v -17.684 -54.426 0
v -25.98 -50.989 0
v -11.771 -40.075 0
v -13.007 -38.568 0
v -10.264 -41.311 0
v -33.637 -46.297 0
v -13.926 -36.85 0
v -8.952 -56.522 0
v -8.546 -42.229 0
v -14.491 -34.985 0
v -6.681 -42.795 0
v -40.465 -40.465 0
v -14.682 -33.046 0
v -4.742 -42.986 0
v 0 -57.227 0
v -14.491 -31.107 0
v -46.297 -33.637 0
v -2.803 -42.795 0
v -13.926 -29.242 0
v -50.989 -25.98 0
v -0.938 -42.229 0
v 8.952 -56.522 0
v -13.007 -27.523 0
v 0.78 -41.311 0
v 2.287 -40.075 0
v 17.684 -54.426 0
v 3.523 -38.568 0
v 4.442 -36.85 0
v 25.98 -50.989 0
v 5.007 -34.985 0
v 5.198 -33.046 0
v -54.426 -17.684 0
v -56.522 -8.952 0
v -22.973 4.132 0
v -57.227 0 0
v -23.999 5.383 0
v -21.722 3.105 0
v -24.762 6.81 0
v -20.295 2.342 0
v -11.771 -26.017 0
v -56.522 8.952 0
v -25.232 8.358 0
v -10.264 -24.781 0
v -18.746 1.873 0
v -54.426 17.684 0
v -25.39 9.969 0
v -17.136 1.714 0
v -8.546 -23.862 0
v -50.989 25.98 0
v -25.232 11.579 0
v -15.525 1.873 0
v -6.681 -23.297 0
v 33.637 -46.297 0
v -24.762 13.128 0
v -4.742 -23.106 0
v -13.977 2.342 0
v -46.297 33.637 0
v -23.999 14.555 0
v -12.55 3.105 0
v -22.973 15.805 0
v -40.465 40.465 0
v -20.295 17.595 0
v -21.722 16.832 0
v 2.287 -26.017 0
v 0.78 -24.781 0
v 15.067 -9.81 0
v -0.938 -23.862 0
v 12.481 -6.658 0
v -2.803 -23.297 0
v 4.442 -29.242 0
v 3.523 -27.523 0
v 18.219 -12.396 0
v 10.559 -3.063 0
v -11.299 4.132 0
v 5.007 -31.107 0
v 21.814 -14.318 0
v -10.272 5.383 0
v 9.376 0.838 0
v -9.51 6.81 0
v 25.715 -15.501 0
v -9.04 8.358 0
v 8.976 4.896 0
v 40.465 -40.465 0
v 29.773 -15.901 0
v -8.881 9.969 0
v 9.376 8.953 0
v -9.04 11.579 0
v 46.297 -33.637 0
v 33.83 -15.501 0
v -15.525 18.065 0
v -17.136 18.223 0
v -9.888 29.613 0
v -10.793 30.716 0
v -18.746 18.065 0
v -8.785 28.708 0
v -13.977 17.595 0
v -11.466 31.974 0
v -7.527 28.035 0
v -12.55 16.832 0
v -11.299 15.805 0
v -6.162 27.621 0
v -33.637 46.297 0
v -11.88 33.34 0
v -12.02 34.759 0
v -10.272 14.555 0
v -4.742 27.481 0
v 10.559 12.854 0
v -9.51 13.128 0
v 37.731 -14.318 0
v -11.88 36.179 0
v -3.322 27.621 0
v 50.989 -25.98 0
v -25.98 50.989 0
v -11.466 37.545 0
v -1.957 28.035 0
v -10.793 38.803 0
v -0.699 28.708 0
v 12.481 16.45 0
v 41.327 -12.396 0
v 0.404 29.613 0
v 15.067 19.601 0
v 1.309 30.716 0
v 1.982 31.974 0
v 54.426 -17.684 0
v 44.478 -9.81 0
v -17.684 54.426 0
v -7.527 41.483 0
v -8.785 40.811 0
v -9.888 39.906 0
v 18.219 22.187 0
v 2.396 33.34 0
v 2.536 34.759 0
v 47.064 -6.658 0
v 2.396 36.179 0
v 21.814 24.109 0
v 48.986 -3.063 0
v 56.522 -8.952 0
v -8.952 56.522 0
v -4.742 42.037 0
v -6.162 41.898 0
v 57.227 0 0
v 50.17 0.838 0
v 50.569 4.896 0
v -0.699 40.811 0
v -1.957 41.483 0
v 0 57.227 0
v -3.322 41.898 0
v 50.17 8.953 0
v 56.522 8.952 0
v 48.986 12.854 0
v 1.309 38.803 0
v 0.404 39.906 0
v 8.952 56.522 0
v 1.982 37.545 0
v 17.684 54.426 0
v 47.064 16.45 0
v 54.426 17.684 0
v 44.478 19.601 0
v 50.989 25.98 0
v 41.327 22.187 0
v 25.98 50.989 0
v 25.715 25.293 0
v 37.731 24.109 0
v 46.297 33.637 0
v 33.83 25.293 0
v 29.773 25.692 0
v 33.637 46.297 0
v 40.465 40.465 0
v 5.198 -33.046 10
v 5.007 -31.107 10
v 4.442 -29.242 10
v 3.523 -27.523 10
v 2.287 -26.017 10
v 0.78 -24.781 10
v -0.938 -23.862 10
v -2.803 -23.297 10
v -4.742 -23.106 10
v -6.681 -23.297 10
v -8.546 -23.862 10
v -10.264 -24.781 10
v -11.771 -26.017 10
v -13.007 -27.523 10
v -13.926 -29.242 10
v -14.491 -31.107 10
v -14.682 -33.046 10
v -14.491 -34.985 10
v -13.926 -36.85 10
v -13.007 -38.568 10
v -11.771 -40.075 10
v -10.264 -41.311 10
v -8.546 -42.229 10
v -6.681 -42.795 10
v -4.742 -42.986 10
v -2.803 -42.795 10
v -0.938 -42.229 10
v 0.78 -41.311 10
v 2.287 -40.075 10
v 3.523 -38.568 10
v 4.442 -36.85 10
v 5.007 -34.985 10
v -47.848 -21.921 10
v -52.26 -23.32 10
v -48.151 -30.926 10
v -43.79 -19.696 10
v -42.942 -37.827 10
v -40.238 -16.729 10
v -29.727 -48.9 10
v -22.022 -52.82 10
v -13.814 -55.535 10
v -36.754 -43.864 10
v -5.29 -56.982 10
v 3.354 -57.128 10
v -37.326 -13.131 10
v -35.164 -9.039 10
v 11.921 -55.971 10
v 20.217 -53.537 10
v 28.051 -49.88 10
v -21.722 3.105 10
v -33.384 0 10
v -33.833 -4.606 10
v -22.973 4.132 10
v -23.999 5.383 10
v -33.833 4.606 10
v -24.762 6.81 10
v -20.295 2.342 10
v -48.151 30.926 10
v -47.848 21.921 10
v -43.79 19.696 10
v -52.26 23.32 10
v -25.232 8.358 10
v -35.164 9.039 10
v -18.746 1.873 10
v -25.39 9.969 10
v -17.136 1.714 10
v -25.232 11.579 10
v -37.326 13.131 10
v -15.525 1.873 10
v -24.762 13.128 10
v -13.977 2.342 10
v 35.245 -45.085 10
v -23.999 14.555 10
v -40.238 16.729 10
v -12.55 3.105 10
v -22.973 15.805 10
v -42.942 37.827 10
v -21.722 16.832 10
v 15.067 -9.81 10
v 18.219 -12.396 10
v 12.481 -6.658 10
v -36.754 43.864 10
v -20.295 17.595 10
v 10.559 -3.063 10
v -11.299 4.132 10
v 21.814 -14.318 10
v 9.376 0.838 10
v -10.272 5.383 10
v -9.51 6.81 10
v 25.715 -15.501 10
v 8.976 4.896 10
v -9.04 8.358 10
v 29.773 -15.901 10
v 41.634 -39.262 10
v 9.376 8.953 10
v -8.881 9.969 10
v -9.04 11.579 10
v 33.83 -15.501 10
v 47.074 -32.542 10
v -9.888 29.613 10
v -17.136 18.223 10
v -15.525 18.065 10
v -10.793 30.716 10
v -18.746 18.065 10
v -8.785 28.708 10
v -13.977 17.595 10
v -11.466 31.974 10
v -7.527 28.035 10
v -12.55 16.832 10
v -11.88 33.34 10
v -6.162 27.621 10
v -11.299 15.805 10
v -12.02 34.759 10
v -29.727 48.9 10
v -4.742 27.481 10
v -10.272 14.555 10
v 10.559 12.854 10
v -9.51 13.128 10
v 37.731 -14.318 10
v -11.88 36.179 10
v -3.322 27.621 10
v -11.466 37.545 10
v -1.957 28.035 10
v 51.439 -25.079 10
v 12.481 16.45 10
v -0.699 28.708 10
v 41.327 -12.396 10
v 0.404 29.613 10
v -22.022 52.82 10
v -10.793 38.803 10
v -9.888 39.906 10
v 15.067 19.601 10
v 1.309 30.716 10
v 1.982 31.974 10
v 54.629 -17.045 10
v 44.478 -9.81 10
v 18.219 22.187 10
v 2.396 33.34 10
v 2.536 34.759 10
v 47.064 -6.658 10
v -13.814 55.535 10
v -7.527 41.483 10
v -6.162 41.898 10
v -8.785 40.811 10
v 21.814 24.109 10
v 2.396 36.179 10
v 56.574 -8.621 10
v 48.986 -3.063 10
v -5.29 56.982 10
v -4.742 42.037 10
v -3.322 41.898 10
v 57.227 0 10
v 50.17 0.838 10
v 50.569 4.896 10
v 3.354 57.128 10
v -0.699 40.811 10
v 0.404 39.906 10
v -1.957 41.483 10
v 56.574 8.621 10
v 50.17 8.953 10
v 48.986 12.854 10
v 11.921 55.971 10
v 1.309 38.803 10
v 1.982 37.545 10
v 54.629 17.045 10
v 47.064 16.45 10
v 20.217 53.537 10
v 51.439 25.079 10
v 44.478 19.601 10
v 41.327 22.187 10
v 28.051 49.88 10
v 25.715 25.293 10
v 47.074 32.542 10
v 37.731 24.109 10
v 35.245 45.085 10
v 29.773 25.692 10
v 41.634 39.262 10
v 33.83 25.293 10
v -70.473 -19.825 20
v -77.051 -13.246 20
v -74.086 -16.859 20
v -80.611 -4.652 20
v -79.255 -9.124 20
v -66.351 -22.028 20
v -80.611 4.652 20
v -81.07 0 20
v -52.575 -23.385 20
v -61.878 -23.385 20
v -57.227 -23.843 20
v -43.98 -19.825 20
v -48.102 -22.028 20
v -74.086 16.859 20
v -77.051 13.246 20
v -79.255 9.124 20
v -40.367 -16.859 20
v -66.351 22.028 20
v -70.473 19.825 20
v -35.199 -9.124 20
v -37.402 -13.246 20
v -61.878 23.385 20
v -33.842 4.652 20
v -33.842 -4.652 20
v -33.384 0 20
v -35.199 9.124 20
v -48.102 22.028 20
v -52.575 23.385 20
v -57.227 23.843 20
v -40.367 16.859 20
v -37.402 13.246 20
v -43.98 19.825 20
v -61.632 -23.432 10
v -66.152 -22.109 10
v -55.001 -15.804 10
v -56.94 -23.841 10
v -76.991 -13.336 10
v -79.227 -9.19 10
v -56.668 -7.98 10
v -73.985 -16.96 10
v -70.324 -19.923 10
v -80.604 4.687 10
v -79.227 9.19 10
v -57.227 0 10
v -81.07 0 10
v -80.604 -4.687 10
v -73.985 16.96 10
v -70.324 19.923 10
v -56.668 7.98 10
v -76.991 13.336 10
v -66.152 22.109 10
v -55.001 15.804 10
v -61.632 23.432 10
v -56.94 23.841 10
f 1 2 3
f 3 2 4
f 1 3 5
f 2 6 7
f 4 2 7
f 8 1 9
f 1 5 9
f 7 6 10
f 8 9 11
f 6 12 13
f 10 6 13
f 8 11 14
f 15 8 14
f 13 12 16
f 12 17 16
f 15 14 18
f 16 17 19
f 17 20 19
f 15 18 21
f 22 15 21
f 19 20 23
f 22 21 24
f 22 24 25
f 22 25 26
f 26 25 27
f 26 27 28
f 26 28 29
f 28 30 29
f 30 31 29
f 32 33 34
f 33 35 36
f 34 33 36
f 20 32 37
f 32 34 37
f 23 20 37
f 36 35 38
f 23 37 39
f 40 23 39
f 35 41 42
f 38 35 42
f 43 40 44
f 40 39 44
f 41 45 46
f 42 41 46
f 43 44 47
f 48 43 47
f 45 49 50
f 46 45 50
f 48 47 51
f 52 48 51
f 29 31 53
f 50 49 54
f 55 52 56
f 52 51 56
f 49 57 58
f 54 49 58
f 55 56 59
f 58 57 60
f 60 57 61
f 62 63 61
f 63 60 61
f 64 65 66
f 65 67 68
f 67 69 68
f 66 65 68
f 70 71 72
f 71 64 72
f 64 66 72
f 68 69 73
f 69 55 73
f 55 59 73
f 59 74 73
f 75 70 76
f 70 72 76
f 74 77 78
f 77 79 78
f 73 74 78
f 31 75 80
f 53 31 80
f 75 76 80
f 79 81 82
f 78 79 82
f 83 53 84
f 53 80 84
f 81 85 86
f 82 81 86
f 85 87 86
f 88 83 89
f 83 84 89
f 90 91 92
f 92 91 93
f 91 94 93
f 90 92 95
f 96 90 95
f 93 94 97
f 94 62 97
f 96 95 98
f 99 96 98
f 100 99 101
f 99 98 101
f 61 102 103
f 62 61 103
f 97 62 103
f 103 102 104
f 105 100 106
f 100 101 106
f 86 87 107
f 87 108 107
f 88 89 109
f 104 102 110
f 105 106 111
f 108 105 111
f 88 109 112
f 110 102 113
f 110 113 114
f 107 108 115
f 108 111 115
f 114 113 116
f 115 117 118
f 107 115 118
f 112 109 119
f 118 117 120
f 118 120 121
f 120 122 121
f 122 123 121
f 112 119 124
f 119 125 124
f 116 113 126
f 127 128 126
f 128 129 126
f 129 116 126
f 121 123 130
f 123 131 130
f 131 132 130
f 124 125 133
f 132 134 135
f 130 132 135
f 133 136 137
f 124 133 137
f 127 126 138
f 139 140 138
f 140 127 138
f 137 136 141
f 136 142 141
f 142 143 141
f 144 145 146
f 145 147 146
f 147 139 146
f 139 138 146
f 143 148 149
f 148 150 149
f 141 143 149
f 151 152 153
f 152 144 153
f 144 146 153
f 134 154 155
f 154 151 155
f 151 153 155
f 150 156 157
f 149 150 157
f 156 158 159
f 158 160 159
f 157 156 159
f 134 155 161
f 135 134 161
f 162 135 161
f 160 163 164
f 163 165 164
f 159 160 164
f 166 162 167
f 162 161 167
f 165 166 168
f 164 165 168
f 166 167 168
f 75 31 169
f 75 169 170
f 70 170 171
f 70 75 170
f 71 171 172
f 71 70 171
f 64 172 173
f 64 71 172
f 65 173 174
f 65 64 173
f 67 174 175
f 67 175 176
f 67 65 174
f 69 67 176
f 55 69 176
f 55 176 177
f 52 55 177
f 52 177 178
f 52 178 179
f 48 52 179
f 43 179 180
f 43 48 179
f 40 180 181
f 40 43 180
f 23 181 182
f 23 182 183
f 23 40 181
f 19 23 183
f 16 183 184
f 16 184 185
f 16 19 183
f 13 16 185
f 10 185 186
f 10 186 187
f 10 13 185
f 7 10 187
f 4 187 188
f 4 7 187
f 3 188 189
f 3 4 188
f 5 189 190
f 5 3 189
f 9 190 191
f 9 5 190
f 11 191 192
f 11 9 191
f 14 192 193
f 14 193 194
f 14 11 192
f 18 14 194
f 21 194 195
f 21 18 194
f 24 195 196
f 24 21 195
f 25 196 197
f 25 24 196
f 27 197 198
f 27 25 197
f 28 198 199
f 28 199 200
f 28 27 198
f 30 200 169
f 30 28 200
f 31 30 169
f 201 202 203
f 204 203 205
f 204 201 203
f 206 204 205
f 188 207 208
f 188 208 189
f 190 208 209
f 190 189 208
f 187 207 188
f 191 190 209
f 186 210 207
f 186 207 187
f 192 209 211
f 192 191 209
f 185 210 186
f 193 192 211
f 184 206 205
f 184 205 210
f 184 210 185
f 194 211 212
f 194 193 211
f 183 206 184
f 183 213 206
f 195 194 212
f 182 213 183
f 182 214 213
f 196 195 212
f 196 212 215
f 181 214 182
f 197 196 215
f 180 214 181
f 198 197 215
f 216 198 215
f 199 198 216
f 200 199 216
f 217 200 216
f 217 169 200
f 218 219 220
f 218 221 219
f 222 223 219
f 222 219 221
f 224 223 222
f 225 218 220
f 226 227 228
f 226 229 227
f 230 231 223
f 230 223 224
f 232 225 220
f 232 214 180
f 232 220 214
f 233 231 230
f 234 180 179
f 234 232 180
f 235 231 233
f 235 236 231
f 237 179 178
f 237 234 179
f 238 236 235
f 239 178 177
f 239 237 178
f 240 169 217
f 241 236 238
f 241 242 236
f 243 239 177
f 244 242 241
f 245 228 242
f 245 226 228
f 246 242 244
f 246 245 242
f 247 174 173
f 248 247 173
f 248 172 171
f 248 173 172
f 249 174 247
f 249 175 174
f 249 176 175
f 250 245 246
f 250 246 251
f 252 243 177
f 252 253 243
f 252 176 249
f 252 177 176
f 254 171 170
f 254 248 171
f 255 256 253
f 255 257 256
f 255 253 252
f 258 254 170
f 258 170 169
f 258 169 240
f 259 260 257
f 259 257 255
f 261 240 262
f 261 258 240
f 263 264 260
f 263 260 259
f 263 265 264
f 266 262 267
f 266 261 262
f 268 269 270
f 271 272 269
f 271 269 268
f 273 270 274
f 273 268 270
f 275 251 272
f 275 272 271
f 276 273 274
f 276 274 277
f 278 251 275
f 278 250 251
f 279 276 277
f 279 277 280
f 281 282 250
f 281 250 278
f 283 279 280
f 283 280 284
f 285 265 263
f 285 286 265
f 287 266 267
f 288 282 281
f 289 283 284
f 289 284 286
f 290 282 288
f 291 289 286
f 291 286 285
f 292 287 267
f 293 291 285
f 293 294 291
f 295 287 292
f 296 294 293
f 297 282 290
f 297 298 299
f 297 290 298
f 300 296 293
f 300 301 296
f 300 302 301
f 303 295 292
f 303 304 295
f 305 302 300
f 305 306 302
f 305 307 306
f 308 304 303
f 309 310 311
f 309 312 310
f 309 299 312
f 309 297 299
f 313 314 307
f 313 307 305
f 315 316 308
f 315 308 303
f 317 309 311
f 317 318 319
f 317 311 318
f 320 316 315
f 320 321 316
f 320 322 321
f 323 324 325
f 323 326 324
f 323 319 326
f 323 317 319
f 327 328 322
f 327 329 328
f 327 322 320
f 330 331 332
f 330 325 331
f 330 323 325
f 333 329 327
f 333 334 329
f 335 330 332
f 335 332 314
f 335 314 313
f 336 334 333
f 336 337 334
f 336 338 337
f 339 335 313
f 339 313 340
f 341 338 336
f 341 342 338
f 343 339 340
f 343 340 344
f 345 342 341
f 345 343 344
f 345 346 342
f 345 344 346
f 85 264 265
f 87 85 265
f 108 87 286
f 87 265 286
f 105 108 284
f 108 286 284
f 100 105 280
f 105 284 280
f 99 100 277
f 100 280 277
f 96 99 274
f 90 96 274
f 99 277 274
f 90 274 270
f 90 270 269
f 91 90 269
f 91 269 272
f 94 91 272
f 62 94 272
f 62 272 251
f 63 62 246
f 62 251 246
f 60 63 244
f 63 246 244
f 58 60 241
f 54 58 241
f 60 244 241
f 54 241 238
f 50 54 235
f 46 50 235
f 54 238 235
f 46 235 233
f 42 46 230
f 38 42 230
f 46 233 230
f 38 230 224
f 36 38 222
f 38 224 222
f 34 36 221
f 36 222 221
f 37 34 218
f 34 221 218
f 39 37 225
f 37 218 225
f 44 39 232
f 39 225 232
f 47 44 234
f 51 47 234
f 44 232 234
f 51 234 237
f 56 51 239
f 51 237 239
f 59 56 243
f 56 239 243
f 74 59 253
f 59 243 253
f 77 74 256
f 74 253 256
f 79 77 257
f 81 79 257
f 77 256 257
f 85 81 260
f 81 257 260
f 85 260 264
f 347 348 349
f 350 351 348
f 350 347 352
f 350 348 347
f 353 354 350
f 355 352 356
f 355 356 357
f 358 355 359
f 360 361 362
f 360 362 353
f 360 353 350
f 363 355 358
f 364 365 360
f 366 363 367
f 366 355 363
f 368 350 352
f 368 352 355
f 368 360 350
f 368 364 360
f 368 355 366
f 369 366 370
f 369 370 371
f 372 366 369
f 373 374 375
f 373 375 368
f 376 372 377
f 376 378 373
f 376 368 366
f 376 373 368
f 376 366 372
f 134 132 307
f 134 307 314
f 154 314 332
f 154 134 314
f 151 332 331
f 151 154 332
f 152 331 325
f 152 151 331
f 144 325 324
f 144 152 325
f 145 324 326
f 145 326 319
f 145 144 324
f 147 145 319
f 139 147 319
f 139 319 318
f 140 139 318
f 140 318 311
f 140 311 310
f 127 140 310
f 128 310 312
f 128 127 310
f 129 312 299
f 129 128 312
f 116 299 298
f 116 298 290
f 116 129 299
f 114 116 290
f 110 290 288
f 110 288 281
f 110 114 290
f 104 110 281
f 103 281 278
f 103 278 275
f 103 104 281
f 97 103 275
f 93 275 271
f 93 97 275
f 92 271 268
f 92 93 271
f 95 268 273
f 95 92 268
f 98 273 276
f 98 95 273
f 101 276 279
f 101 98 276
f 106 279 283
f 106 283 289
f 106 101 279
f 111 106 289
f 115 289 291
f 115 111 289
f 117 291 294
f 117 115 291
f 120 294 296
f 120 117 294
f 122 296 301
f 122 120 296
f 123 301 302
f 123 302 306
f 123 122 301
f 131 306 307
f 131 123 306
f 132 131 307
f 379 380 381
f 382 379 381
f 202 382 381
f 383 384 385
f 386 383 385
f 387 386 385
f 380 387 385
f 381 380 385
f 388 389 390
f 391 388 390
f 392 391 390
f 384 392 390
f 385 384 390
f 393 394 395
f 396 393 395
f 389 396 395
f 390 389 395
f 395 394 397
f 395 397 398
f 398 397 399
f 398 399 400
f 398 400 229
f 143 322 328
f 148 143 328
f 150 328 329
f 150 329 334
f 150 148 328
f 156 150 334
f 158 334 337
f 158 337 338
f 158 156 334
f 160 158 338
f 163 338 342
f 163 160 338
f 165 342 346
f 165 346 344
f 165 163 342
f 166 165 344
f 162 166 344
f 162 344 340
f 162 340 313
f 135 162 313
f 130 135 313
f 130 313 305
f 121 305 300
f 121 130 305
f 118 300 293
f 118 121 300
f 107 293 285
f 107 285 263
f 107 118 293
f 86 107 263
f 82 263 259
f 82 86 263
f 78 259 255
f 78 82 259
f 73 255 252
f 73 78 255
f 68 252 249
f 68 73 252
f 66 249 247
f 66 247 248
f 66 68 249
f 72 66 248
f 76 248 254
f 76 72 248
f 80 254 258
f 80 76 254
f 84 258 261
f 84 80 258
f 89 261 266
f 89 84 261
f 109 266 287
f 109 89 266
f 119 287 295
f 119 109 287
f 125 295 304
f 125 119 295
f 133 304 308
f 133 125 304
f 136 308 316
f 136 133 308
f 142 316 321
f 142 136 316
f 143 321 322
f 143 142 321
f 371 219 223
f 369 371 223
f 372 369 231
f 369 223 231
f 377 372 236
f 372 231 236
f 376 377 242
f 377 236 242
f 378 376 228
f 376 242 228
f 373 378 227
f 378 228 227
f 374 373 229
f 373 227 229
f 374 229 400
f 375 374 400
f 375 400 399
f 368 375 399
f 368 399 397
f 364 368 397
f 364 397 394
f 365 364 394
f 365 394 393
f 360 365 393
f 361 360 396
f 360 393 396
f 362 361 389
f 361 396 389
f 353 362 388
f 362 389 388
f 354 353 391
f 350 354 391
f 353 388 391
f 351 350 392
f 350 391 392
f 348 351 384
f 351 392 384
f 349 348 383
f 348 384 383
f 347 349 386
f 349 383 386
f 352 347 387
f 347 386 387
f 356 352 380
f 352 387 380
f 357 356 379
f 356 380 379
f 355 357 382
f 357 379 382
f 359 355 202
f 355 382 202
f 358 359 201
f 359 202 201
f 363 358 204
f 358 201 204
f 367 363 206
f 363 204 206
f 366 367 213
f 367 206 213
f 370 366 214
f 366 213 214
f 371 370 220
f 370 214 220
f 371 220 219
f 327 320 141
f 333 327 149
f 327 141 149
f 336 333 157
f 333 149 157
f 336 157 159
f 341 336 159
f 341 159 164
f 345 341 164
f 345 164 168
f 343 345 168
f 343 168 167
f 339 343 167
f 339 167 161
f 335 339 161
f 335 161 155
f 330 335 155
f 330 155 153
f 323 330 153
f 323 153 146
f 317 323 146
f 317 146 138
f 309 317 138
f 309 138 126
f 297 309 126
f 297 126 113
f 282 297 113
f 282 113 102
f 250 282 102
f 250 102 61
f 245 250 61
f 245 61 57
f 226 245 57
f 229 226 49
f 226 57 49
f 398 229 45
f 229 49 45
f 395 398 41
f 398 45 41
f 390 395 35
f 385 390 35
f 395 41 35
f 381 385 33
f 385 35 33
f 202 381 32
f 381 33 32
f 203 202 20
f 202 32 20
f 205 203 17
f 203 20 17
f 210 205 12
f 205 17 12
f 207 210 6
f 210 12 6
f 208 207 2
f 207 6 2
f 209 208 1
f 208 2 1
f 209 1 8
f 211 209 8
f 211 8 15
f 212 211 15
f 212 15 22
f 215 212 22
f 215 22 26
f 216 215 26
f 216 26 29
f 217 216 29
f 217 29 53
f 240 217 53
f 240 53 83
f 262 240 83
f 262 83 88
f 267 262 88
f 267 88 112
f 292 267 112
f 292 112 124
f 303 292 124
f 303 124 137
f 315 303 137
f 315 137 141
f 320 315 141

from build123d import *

# Parameters (mm, degrees)
CROQUIS1_R              = 57.226702921
CROQUIS1_R_2            = 7.277968804
CROQUIS1_R_3            = 9.940183118
CROQUIS1_R_4            = 20.796607535
SALIENTE_EXTRUIR1_DEPTH = 10
CROQUIS2_R              = 23.842859528
SALIENTE_EXTRUIR2_DEPTH = 10
CROQUIS3_R              = 8.254589986
CORTAR_EXTRUIR1_DEPTH   = 10


with BuildPart() as part:
    # Croquis1 → Saliente-Extruir1 (new body)
    with BuildSketch(Plane.XY):
        Circle(CROQUIS1_R)
        with Locations((-4.741989664, 34.759410431)):
            Circle(CROQUIS1_R_2, mode=Mode.SUBTRACT)
        with Locations((-4.741989664, -33.045918367)):
            Circle(CROQUIS1_R_3, mode=Mode.SUBTRACT)
        with Locations((29.772636186, 4.89569161)):
            Circle(CROQUIS1_R_4, mode=Mode.SUBTRACT)
    extrude(amount=SALIENTE_EXTRUIR1_DEPTH)

    # Croquis2 → Saliente-Extruir2 (add)
    with BuildSketch(Plane.XY.offset(10)):
        with Locations((-57.226702921, 0)):
            Circle(CROQUIS2_R)
    extrude(amount=SALIENTE_EXTRUIR2_DEPTH)

    # Croquis3 → Cortar-Extruir1 (cut)
    with BuildSketch(Plane.XY.offset(10)):
        with Locations((-17.135779728, 9.968610226)):
            Circle(CROQUIS3_R)
    extrude(amount=-CORTAR_EXTRUIR1_DEPTH, mode=Mode.SUBTRACT)


solid = part.part
